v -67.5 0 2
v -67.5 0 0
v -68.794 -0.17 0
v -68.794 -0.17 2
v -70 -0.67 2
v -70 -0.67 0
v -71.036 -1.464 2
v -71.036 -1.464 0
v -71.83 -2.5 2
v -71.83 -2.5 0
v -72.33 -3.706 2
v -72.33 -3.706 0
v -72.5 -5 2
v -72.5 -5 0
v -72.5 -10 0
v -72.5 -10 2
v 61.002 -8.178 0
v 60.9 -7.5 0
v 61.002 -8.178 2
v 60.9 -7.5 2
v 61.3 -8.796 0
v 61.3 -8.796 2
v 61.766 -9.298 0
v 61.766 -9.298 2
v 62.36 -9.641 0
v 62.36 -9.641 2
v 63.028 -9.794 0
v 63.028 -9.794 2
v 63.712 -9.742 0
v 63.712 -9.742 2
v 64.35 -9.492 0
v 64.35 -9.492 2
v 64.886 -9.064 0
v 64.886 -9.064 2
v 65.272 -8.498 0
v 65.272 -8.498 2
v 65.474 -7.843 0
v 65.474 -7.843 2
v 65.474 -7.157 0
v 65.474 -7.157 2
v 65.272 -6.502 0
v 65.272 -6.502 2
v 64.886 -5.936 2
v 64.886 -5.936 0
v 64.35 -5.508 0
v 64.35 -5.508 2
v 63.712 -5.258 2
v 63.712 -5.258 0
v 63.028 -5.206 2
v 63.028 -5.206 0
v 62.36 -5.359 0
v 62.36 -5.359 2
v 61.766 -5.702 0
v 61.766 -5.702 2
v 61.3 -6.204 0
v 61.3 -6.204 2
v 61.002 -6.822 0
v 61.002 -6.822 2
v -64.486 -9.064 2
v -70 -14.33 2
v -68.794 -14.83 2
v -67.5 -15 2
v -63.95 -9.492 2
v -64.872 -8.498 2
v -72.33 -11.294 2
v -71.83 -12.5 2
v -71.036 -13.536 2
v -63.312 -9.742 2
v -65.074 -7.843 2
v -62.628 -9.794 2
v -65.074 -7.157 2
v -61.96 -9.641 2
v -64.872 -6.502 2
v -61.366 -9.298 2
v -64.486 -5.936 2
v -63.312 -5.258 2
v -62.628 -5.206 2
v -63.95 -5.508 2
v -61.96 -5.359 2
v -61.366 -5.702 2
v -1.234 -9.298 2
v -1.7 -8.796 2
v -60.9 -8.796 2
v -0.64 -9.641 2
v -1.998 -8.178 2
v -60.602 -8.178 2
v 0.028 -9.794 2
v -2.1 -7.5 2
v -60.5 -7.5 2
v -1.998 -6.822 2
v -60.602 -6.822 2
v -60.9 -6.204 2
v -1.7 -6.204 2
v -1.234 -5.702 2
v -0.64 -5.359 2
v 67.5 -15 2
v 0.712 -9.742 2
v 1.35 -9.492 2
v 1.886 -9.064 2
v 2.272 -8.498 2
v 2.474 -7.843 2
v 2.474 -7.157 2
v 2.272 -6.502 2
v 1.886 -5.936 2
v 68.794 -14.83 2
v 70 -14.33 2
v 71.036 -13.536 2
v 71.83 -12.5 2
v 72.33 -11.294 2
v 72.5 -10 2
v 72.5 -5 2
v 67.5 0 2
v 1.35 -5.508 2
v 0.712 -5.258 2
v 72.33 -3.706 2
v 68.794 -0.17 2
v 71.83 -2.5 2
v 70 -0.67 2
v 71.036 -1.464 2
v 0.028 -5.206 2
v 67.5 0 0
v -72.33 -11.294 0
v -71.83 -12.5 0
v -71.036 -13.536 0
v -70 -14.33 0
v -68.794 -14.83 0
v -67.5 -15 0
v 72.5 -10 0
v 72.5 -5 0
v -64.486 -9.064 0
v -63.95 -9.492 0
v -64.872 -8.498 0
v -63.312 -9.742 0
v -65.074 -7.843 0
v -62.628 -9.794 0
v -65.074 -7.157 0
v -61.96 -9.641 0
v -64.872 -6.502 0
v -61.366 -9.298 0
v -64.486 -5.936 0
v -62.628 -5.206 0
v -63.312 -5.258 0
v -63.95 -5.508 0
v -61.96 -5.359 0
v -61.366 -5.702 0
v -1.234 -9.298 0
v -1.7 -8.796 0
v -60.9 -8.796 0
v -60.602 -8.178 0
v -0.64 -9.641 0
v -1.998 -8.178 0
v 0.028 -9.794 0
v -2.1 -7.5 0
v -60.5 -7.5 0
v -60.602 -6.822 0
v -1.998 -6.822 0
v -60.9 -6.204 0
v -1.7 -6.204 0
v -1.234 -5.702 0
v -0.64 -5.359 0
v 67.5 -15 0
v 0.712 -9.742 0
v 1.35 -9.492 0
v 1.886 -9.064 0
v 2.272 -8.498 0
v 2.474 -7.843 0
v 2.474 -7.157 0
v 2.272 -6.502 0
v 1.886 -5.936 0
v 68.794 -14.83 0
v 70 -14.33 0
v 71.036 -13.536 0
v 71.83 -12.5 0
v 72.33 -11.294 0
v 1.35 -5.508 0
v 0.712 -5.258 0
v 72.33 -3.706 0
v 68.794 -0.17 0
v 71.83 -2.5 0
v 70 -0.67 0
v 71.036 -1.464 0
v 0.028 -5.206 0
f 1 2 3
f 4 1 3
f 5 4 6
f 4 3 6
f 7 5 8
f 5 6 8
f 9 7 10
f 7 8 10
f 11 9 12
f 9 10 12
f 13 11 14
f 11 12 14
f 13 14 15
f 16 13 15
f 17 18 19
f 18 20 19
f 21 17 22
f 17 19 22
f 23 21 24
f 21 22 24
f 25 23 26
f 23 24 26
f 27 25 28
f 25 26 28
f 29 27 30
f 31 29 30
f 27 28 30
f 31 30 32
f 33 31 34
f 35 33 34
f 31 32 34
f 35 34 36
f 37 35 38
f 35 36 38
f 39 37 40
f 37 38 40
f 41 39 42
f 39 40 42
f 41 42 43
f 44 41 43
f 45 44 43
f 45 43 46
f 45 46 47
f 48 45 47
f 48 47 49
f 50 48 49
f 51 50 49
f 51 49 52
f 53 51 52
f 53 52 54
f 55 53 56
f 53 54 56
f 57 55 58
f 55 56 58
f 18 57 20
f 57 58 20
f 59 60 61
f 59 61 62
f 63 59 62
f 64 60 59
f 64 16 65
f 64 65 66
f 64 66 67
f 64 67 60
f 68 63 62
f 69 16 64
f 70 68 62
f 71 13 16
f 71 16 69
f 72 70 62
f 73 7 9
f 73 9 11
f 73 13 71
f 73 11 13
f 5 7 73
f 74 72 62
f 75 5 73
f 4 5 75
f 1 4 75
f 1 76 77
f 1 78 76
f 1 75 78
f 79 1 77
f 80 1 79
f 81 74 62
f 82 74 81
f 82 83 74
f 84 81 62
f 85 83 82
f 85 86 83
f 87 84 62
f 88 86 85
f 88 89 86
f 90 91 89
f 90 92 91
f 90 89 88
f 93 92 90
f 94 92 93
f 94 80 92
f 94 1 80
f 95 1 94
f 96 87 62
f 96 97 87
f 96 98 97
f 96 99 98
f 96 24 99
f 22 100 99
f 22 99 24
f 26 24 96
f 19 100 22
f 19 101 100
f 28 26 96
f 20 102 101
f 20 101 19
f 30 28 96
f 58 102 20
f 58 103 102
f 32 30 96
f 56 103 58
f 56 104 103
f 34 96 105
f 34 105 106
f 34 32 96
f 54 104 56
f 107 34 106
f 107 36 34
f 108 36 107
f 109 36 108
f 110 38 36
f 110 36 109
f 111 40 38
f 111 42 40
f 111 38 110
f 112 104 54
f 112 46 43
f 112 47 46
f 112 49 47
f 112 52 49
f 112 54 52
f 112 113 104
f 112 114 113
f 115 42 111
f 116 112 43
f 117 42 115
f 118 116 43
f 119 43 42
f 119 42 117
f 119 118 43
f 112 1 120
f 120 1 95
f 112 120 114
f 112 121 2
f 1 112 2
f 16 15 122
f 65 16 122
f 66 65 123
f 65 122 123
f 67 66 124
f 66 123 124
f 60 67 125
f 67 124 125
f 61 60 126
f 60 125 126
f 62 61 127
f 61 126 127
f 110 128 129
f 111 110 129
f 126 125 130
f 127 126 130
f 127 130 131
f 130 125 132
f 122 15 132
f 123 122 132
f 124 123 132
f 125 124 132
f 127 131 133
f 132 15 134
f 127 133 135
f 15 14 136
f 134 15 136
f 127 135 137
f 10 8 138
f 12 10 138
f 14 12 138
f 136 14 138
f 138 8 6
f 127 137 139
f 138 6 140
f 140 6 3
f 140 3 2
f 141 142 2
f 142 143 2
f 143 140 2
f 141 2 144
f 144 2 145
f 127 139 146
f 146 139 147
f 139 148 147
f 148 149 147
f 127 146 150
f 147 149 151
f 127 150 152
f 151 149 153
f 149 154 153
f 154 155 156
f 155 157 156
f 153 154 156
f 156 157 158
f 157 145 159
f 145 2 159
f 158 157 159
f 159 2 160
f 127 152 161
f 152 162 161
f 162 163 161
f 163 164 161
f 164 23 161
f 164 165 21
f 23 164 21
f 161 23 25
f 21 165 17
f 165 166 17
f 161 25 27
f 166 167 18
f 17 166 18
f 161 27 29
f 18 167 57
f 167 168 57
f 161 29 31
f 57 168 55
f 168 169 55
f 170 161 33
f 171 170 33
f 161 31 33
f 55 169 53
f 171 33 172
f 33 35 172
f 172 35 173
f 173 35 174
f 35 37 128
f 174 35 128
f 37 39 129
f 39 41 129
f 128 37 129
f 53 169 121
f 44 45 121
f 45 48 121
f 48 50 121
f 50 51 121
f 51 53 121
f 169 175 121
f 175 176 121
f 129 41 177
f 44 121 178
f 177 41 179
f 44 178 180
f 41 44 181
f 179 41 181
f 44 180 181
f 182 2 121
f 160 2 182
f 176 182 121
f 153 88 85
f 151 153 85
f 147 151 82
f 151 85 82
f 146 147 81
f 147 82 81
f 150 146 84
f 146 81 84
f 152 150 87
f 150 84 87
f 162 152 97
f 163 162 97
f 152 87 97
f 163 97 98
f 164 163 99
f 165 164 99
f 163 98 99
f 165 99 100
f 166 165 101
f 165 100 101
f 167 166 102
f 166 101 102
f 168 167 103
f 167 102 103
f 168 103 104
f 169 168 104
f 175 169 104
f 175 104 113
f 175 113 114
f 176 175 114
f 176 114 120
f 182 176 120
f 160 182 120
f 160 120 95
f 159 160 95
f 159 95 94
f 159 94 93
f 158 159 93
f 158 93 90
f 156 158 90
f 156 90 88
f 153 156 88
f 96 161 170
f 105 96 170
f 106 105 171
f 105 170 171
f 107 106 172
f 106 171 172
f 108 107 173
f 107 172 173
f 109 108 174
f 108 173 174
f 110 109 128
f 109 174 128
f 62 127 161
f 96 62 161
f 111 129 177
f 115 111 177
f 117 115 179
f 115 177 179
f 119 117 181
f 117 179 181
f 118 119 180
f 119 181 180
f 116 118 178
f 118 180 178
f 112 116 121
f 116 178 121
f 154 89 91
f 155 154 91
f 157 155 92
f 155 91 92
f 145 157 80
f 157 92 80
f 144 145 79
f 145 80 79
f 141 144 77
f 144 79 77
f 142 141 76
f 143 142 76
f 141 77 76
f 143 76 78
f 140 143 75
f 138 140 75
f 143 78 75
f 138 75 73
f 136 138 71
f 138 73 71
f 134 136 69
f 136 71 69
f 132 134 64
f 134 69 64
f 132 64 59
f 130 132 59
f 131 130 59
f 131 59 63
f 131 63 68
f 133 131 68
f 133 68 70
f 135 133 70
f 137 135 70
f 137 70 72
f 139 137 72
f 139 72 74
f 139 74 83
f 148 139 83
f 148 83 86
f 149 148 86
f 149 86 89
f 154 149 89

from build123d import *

# Parameters (mm, degrees)
F1_DEPTH = 2
F3_DEPTH = 12.5


with BuildPart() as f1:
    # F0 (on Top) → F1 (new body)
    with BuildSketch(Plane.XY):
        with BuildLine():
            Line((67.5, 0), (-67.5, 0))
            ThreePointArc((-67.5, 0), (-71.0355339059, -1.4644660941), (-72.5, -5))
            Line((-72.5, -5), (-72.5, -10))
            ThreePointArc((-72.5, -10), (-71.0355339059, -13.5355339059), (-67.5, -15))
            Line((-67.5, -15), (67.5, -15))
            ThreePointArc((67.5, -15), (71.0355339059, -13.5355339059), (72.5, -10))
            Line((72.5, -10), (72.5, -5))
            ThreePointArc((72.5, -5), (71.0355339059, -1.4644660941), (67.5, 0))
        make_face()
    extrude(amount=F1_DEPTH)

    # F2 (on face) → F3 (cut, symmetric)
    with BuildSketch(Plane.XY.offset(2)):
        with BuildLine():
            Line((-62.8, -7.5), (-65.1, -7.5))
            ThreePointArc((-65.1, -7.5), (-62.8, -9.8), (-60.5, -7.5))
            Line((-60.5, -7.5), (-62.8, -7.5))
        make_face()
        with BuildLine():
            ThreePointArc((-60.5, -7.5), (-62.8, -5.2), (-65.1, -7.5))
            Line((-65.1, -7.5), (-62.8, -7.5))
            Line((-62.8, -7.5), (-60.5, -7.5))
        make_face()
        with BuildLine():
            ThreePointArc((2.5, -7.5), (0.2, -5.2), (-2.1, -7.5))
            Line((-2.1, -7.5), (0.2, -7.5))
            Line((0.2, -7.5), (2.5, -7.5))
        make_face()
        with BuildLine():
            Line((0.2, -7.5), (-2.1, -7.5))
            ThreePointArc((-2.1, -7.5), (0.2, -9.8), (2.5, -7.5))
            Line((2.5, -7.5), (0.2, -7.5))
        make_face()
        with BuildLine():
            ThreePointArc((65.5, -7.5), (63.2, -5.2), (60.9, -7.5))
            ThreePointArc((60.9, -7.5), (63.2, -9.8), (65.5, -7.5))
        make_face()
    extrude(amount=F3_DEPTH, both=True, mode=Mode.SUBTRACT)


solid = f1.part
